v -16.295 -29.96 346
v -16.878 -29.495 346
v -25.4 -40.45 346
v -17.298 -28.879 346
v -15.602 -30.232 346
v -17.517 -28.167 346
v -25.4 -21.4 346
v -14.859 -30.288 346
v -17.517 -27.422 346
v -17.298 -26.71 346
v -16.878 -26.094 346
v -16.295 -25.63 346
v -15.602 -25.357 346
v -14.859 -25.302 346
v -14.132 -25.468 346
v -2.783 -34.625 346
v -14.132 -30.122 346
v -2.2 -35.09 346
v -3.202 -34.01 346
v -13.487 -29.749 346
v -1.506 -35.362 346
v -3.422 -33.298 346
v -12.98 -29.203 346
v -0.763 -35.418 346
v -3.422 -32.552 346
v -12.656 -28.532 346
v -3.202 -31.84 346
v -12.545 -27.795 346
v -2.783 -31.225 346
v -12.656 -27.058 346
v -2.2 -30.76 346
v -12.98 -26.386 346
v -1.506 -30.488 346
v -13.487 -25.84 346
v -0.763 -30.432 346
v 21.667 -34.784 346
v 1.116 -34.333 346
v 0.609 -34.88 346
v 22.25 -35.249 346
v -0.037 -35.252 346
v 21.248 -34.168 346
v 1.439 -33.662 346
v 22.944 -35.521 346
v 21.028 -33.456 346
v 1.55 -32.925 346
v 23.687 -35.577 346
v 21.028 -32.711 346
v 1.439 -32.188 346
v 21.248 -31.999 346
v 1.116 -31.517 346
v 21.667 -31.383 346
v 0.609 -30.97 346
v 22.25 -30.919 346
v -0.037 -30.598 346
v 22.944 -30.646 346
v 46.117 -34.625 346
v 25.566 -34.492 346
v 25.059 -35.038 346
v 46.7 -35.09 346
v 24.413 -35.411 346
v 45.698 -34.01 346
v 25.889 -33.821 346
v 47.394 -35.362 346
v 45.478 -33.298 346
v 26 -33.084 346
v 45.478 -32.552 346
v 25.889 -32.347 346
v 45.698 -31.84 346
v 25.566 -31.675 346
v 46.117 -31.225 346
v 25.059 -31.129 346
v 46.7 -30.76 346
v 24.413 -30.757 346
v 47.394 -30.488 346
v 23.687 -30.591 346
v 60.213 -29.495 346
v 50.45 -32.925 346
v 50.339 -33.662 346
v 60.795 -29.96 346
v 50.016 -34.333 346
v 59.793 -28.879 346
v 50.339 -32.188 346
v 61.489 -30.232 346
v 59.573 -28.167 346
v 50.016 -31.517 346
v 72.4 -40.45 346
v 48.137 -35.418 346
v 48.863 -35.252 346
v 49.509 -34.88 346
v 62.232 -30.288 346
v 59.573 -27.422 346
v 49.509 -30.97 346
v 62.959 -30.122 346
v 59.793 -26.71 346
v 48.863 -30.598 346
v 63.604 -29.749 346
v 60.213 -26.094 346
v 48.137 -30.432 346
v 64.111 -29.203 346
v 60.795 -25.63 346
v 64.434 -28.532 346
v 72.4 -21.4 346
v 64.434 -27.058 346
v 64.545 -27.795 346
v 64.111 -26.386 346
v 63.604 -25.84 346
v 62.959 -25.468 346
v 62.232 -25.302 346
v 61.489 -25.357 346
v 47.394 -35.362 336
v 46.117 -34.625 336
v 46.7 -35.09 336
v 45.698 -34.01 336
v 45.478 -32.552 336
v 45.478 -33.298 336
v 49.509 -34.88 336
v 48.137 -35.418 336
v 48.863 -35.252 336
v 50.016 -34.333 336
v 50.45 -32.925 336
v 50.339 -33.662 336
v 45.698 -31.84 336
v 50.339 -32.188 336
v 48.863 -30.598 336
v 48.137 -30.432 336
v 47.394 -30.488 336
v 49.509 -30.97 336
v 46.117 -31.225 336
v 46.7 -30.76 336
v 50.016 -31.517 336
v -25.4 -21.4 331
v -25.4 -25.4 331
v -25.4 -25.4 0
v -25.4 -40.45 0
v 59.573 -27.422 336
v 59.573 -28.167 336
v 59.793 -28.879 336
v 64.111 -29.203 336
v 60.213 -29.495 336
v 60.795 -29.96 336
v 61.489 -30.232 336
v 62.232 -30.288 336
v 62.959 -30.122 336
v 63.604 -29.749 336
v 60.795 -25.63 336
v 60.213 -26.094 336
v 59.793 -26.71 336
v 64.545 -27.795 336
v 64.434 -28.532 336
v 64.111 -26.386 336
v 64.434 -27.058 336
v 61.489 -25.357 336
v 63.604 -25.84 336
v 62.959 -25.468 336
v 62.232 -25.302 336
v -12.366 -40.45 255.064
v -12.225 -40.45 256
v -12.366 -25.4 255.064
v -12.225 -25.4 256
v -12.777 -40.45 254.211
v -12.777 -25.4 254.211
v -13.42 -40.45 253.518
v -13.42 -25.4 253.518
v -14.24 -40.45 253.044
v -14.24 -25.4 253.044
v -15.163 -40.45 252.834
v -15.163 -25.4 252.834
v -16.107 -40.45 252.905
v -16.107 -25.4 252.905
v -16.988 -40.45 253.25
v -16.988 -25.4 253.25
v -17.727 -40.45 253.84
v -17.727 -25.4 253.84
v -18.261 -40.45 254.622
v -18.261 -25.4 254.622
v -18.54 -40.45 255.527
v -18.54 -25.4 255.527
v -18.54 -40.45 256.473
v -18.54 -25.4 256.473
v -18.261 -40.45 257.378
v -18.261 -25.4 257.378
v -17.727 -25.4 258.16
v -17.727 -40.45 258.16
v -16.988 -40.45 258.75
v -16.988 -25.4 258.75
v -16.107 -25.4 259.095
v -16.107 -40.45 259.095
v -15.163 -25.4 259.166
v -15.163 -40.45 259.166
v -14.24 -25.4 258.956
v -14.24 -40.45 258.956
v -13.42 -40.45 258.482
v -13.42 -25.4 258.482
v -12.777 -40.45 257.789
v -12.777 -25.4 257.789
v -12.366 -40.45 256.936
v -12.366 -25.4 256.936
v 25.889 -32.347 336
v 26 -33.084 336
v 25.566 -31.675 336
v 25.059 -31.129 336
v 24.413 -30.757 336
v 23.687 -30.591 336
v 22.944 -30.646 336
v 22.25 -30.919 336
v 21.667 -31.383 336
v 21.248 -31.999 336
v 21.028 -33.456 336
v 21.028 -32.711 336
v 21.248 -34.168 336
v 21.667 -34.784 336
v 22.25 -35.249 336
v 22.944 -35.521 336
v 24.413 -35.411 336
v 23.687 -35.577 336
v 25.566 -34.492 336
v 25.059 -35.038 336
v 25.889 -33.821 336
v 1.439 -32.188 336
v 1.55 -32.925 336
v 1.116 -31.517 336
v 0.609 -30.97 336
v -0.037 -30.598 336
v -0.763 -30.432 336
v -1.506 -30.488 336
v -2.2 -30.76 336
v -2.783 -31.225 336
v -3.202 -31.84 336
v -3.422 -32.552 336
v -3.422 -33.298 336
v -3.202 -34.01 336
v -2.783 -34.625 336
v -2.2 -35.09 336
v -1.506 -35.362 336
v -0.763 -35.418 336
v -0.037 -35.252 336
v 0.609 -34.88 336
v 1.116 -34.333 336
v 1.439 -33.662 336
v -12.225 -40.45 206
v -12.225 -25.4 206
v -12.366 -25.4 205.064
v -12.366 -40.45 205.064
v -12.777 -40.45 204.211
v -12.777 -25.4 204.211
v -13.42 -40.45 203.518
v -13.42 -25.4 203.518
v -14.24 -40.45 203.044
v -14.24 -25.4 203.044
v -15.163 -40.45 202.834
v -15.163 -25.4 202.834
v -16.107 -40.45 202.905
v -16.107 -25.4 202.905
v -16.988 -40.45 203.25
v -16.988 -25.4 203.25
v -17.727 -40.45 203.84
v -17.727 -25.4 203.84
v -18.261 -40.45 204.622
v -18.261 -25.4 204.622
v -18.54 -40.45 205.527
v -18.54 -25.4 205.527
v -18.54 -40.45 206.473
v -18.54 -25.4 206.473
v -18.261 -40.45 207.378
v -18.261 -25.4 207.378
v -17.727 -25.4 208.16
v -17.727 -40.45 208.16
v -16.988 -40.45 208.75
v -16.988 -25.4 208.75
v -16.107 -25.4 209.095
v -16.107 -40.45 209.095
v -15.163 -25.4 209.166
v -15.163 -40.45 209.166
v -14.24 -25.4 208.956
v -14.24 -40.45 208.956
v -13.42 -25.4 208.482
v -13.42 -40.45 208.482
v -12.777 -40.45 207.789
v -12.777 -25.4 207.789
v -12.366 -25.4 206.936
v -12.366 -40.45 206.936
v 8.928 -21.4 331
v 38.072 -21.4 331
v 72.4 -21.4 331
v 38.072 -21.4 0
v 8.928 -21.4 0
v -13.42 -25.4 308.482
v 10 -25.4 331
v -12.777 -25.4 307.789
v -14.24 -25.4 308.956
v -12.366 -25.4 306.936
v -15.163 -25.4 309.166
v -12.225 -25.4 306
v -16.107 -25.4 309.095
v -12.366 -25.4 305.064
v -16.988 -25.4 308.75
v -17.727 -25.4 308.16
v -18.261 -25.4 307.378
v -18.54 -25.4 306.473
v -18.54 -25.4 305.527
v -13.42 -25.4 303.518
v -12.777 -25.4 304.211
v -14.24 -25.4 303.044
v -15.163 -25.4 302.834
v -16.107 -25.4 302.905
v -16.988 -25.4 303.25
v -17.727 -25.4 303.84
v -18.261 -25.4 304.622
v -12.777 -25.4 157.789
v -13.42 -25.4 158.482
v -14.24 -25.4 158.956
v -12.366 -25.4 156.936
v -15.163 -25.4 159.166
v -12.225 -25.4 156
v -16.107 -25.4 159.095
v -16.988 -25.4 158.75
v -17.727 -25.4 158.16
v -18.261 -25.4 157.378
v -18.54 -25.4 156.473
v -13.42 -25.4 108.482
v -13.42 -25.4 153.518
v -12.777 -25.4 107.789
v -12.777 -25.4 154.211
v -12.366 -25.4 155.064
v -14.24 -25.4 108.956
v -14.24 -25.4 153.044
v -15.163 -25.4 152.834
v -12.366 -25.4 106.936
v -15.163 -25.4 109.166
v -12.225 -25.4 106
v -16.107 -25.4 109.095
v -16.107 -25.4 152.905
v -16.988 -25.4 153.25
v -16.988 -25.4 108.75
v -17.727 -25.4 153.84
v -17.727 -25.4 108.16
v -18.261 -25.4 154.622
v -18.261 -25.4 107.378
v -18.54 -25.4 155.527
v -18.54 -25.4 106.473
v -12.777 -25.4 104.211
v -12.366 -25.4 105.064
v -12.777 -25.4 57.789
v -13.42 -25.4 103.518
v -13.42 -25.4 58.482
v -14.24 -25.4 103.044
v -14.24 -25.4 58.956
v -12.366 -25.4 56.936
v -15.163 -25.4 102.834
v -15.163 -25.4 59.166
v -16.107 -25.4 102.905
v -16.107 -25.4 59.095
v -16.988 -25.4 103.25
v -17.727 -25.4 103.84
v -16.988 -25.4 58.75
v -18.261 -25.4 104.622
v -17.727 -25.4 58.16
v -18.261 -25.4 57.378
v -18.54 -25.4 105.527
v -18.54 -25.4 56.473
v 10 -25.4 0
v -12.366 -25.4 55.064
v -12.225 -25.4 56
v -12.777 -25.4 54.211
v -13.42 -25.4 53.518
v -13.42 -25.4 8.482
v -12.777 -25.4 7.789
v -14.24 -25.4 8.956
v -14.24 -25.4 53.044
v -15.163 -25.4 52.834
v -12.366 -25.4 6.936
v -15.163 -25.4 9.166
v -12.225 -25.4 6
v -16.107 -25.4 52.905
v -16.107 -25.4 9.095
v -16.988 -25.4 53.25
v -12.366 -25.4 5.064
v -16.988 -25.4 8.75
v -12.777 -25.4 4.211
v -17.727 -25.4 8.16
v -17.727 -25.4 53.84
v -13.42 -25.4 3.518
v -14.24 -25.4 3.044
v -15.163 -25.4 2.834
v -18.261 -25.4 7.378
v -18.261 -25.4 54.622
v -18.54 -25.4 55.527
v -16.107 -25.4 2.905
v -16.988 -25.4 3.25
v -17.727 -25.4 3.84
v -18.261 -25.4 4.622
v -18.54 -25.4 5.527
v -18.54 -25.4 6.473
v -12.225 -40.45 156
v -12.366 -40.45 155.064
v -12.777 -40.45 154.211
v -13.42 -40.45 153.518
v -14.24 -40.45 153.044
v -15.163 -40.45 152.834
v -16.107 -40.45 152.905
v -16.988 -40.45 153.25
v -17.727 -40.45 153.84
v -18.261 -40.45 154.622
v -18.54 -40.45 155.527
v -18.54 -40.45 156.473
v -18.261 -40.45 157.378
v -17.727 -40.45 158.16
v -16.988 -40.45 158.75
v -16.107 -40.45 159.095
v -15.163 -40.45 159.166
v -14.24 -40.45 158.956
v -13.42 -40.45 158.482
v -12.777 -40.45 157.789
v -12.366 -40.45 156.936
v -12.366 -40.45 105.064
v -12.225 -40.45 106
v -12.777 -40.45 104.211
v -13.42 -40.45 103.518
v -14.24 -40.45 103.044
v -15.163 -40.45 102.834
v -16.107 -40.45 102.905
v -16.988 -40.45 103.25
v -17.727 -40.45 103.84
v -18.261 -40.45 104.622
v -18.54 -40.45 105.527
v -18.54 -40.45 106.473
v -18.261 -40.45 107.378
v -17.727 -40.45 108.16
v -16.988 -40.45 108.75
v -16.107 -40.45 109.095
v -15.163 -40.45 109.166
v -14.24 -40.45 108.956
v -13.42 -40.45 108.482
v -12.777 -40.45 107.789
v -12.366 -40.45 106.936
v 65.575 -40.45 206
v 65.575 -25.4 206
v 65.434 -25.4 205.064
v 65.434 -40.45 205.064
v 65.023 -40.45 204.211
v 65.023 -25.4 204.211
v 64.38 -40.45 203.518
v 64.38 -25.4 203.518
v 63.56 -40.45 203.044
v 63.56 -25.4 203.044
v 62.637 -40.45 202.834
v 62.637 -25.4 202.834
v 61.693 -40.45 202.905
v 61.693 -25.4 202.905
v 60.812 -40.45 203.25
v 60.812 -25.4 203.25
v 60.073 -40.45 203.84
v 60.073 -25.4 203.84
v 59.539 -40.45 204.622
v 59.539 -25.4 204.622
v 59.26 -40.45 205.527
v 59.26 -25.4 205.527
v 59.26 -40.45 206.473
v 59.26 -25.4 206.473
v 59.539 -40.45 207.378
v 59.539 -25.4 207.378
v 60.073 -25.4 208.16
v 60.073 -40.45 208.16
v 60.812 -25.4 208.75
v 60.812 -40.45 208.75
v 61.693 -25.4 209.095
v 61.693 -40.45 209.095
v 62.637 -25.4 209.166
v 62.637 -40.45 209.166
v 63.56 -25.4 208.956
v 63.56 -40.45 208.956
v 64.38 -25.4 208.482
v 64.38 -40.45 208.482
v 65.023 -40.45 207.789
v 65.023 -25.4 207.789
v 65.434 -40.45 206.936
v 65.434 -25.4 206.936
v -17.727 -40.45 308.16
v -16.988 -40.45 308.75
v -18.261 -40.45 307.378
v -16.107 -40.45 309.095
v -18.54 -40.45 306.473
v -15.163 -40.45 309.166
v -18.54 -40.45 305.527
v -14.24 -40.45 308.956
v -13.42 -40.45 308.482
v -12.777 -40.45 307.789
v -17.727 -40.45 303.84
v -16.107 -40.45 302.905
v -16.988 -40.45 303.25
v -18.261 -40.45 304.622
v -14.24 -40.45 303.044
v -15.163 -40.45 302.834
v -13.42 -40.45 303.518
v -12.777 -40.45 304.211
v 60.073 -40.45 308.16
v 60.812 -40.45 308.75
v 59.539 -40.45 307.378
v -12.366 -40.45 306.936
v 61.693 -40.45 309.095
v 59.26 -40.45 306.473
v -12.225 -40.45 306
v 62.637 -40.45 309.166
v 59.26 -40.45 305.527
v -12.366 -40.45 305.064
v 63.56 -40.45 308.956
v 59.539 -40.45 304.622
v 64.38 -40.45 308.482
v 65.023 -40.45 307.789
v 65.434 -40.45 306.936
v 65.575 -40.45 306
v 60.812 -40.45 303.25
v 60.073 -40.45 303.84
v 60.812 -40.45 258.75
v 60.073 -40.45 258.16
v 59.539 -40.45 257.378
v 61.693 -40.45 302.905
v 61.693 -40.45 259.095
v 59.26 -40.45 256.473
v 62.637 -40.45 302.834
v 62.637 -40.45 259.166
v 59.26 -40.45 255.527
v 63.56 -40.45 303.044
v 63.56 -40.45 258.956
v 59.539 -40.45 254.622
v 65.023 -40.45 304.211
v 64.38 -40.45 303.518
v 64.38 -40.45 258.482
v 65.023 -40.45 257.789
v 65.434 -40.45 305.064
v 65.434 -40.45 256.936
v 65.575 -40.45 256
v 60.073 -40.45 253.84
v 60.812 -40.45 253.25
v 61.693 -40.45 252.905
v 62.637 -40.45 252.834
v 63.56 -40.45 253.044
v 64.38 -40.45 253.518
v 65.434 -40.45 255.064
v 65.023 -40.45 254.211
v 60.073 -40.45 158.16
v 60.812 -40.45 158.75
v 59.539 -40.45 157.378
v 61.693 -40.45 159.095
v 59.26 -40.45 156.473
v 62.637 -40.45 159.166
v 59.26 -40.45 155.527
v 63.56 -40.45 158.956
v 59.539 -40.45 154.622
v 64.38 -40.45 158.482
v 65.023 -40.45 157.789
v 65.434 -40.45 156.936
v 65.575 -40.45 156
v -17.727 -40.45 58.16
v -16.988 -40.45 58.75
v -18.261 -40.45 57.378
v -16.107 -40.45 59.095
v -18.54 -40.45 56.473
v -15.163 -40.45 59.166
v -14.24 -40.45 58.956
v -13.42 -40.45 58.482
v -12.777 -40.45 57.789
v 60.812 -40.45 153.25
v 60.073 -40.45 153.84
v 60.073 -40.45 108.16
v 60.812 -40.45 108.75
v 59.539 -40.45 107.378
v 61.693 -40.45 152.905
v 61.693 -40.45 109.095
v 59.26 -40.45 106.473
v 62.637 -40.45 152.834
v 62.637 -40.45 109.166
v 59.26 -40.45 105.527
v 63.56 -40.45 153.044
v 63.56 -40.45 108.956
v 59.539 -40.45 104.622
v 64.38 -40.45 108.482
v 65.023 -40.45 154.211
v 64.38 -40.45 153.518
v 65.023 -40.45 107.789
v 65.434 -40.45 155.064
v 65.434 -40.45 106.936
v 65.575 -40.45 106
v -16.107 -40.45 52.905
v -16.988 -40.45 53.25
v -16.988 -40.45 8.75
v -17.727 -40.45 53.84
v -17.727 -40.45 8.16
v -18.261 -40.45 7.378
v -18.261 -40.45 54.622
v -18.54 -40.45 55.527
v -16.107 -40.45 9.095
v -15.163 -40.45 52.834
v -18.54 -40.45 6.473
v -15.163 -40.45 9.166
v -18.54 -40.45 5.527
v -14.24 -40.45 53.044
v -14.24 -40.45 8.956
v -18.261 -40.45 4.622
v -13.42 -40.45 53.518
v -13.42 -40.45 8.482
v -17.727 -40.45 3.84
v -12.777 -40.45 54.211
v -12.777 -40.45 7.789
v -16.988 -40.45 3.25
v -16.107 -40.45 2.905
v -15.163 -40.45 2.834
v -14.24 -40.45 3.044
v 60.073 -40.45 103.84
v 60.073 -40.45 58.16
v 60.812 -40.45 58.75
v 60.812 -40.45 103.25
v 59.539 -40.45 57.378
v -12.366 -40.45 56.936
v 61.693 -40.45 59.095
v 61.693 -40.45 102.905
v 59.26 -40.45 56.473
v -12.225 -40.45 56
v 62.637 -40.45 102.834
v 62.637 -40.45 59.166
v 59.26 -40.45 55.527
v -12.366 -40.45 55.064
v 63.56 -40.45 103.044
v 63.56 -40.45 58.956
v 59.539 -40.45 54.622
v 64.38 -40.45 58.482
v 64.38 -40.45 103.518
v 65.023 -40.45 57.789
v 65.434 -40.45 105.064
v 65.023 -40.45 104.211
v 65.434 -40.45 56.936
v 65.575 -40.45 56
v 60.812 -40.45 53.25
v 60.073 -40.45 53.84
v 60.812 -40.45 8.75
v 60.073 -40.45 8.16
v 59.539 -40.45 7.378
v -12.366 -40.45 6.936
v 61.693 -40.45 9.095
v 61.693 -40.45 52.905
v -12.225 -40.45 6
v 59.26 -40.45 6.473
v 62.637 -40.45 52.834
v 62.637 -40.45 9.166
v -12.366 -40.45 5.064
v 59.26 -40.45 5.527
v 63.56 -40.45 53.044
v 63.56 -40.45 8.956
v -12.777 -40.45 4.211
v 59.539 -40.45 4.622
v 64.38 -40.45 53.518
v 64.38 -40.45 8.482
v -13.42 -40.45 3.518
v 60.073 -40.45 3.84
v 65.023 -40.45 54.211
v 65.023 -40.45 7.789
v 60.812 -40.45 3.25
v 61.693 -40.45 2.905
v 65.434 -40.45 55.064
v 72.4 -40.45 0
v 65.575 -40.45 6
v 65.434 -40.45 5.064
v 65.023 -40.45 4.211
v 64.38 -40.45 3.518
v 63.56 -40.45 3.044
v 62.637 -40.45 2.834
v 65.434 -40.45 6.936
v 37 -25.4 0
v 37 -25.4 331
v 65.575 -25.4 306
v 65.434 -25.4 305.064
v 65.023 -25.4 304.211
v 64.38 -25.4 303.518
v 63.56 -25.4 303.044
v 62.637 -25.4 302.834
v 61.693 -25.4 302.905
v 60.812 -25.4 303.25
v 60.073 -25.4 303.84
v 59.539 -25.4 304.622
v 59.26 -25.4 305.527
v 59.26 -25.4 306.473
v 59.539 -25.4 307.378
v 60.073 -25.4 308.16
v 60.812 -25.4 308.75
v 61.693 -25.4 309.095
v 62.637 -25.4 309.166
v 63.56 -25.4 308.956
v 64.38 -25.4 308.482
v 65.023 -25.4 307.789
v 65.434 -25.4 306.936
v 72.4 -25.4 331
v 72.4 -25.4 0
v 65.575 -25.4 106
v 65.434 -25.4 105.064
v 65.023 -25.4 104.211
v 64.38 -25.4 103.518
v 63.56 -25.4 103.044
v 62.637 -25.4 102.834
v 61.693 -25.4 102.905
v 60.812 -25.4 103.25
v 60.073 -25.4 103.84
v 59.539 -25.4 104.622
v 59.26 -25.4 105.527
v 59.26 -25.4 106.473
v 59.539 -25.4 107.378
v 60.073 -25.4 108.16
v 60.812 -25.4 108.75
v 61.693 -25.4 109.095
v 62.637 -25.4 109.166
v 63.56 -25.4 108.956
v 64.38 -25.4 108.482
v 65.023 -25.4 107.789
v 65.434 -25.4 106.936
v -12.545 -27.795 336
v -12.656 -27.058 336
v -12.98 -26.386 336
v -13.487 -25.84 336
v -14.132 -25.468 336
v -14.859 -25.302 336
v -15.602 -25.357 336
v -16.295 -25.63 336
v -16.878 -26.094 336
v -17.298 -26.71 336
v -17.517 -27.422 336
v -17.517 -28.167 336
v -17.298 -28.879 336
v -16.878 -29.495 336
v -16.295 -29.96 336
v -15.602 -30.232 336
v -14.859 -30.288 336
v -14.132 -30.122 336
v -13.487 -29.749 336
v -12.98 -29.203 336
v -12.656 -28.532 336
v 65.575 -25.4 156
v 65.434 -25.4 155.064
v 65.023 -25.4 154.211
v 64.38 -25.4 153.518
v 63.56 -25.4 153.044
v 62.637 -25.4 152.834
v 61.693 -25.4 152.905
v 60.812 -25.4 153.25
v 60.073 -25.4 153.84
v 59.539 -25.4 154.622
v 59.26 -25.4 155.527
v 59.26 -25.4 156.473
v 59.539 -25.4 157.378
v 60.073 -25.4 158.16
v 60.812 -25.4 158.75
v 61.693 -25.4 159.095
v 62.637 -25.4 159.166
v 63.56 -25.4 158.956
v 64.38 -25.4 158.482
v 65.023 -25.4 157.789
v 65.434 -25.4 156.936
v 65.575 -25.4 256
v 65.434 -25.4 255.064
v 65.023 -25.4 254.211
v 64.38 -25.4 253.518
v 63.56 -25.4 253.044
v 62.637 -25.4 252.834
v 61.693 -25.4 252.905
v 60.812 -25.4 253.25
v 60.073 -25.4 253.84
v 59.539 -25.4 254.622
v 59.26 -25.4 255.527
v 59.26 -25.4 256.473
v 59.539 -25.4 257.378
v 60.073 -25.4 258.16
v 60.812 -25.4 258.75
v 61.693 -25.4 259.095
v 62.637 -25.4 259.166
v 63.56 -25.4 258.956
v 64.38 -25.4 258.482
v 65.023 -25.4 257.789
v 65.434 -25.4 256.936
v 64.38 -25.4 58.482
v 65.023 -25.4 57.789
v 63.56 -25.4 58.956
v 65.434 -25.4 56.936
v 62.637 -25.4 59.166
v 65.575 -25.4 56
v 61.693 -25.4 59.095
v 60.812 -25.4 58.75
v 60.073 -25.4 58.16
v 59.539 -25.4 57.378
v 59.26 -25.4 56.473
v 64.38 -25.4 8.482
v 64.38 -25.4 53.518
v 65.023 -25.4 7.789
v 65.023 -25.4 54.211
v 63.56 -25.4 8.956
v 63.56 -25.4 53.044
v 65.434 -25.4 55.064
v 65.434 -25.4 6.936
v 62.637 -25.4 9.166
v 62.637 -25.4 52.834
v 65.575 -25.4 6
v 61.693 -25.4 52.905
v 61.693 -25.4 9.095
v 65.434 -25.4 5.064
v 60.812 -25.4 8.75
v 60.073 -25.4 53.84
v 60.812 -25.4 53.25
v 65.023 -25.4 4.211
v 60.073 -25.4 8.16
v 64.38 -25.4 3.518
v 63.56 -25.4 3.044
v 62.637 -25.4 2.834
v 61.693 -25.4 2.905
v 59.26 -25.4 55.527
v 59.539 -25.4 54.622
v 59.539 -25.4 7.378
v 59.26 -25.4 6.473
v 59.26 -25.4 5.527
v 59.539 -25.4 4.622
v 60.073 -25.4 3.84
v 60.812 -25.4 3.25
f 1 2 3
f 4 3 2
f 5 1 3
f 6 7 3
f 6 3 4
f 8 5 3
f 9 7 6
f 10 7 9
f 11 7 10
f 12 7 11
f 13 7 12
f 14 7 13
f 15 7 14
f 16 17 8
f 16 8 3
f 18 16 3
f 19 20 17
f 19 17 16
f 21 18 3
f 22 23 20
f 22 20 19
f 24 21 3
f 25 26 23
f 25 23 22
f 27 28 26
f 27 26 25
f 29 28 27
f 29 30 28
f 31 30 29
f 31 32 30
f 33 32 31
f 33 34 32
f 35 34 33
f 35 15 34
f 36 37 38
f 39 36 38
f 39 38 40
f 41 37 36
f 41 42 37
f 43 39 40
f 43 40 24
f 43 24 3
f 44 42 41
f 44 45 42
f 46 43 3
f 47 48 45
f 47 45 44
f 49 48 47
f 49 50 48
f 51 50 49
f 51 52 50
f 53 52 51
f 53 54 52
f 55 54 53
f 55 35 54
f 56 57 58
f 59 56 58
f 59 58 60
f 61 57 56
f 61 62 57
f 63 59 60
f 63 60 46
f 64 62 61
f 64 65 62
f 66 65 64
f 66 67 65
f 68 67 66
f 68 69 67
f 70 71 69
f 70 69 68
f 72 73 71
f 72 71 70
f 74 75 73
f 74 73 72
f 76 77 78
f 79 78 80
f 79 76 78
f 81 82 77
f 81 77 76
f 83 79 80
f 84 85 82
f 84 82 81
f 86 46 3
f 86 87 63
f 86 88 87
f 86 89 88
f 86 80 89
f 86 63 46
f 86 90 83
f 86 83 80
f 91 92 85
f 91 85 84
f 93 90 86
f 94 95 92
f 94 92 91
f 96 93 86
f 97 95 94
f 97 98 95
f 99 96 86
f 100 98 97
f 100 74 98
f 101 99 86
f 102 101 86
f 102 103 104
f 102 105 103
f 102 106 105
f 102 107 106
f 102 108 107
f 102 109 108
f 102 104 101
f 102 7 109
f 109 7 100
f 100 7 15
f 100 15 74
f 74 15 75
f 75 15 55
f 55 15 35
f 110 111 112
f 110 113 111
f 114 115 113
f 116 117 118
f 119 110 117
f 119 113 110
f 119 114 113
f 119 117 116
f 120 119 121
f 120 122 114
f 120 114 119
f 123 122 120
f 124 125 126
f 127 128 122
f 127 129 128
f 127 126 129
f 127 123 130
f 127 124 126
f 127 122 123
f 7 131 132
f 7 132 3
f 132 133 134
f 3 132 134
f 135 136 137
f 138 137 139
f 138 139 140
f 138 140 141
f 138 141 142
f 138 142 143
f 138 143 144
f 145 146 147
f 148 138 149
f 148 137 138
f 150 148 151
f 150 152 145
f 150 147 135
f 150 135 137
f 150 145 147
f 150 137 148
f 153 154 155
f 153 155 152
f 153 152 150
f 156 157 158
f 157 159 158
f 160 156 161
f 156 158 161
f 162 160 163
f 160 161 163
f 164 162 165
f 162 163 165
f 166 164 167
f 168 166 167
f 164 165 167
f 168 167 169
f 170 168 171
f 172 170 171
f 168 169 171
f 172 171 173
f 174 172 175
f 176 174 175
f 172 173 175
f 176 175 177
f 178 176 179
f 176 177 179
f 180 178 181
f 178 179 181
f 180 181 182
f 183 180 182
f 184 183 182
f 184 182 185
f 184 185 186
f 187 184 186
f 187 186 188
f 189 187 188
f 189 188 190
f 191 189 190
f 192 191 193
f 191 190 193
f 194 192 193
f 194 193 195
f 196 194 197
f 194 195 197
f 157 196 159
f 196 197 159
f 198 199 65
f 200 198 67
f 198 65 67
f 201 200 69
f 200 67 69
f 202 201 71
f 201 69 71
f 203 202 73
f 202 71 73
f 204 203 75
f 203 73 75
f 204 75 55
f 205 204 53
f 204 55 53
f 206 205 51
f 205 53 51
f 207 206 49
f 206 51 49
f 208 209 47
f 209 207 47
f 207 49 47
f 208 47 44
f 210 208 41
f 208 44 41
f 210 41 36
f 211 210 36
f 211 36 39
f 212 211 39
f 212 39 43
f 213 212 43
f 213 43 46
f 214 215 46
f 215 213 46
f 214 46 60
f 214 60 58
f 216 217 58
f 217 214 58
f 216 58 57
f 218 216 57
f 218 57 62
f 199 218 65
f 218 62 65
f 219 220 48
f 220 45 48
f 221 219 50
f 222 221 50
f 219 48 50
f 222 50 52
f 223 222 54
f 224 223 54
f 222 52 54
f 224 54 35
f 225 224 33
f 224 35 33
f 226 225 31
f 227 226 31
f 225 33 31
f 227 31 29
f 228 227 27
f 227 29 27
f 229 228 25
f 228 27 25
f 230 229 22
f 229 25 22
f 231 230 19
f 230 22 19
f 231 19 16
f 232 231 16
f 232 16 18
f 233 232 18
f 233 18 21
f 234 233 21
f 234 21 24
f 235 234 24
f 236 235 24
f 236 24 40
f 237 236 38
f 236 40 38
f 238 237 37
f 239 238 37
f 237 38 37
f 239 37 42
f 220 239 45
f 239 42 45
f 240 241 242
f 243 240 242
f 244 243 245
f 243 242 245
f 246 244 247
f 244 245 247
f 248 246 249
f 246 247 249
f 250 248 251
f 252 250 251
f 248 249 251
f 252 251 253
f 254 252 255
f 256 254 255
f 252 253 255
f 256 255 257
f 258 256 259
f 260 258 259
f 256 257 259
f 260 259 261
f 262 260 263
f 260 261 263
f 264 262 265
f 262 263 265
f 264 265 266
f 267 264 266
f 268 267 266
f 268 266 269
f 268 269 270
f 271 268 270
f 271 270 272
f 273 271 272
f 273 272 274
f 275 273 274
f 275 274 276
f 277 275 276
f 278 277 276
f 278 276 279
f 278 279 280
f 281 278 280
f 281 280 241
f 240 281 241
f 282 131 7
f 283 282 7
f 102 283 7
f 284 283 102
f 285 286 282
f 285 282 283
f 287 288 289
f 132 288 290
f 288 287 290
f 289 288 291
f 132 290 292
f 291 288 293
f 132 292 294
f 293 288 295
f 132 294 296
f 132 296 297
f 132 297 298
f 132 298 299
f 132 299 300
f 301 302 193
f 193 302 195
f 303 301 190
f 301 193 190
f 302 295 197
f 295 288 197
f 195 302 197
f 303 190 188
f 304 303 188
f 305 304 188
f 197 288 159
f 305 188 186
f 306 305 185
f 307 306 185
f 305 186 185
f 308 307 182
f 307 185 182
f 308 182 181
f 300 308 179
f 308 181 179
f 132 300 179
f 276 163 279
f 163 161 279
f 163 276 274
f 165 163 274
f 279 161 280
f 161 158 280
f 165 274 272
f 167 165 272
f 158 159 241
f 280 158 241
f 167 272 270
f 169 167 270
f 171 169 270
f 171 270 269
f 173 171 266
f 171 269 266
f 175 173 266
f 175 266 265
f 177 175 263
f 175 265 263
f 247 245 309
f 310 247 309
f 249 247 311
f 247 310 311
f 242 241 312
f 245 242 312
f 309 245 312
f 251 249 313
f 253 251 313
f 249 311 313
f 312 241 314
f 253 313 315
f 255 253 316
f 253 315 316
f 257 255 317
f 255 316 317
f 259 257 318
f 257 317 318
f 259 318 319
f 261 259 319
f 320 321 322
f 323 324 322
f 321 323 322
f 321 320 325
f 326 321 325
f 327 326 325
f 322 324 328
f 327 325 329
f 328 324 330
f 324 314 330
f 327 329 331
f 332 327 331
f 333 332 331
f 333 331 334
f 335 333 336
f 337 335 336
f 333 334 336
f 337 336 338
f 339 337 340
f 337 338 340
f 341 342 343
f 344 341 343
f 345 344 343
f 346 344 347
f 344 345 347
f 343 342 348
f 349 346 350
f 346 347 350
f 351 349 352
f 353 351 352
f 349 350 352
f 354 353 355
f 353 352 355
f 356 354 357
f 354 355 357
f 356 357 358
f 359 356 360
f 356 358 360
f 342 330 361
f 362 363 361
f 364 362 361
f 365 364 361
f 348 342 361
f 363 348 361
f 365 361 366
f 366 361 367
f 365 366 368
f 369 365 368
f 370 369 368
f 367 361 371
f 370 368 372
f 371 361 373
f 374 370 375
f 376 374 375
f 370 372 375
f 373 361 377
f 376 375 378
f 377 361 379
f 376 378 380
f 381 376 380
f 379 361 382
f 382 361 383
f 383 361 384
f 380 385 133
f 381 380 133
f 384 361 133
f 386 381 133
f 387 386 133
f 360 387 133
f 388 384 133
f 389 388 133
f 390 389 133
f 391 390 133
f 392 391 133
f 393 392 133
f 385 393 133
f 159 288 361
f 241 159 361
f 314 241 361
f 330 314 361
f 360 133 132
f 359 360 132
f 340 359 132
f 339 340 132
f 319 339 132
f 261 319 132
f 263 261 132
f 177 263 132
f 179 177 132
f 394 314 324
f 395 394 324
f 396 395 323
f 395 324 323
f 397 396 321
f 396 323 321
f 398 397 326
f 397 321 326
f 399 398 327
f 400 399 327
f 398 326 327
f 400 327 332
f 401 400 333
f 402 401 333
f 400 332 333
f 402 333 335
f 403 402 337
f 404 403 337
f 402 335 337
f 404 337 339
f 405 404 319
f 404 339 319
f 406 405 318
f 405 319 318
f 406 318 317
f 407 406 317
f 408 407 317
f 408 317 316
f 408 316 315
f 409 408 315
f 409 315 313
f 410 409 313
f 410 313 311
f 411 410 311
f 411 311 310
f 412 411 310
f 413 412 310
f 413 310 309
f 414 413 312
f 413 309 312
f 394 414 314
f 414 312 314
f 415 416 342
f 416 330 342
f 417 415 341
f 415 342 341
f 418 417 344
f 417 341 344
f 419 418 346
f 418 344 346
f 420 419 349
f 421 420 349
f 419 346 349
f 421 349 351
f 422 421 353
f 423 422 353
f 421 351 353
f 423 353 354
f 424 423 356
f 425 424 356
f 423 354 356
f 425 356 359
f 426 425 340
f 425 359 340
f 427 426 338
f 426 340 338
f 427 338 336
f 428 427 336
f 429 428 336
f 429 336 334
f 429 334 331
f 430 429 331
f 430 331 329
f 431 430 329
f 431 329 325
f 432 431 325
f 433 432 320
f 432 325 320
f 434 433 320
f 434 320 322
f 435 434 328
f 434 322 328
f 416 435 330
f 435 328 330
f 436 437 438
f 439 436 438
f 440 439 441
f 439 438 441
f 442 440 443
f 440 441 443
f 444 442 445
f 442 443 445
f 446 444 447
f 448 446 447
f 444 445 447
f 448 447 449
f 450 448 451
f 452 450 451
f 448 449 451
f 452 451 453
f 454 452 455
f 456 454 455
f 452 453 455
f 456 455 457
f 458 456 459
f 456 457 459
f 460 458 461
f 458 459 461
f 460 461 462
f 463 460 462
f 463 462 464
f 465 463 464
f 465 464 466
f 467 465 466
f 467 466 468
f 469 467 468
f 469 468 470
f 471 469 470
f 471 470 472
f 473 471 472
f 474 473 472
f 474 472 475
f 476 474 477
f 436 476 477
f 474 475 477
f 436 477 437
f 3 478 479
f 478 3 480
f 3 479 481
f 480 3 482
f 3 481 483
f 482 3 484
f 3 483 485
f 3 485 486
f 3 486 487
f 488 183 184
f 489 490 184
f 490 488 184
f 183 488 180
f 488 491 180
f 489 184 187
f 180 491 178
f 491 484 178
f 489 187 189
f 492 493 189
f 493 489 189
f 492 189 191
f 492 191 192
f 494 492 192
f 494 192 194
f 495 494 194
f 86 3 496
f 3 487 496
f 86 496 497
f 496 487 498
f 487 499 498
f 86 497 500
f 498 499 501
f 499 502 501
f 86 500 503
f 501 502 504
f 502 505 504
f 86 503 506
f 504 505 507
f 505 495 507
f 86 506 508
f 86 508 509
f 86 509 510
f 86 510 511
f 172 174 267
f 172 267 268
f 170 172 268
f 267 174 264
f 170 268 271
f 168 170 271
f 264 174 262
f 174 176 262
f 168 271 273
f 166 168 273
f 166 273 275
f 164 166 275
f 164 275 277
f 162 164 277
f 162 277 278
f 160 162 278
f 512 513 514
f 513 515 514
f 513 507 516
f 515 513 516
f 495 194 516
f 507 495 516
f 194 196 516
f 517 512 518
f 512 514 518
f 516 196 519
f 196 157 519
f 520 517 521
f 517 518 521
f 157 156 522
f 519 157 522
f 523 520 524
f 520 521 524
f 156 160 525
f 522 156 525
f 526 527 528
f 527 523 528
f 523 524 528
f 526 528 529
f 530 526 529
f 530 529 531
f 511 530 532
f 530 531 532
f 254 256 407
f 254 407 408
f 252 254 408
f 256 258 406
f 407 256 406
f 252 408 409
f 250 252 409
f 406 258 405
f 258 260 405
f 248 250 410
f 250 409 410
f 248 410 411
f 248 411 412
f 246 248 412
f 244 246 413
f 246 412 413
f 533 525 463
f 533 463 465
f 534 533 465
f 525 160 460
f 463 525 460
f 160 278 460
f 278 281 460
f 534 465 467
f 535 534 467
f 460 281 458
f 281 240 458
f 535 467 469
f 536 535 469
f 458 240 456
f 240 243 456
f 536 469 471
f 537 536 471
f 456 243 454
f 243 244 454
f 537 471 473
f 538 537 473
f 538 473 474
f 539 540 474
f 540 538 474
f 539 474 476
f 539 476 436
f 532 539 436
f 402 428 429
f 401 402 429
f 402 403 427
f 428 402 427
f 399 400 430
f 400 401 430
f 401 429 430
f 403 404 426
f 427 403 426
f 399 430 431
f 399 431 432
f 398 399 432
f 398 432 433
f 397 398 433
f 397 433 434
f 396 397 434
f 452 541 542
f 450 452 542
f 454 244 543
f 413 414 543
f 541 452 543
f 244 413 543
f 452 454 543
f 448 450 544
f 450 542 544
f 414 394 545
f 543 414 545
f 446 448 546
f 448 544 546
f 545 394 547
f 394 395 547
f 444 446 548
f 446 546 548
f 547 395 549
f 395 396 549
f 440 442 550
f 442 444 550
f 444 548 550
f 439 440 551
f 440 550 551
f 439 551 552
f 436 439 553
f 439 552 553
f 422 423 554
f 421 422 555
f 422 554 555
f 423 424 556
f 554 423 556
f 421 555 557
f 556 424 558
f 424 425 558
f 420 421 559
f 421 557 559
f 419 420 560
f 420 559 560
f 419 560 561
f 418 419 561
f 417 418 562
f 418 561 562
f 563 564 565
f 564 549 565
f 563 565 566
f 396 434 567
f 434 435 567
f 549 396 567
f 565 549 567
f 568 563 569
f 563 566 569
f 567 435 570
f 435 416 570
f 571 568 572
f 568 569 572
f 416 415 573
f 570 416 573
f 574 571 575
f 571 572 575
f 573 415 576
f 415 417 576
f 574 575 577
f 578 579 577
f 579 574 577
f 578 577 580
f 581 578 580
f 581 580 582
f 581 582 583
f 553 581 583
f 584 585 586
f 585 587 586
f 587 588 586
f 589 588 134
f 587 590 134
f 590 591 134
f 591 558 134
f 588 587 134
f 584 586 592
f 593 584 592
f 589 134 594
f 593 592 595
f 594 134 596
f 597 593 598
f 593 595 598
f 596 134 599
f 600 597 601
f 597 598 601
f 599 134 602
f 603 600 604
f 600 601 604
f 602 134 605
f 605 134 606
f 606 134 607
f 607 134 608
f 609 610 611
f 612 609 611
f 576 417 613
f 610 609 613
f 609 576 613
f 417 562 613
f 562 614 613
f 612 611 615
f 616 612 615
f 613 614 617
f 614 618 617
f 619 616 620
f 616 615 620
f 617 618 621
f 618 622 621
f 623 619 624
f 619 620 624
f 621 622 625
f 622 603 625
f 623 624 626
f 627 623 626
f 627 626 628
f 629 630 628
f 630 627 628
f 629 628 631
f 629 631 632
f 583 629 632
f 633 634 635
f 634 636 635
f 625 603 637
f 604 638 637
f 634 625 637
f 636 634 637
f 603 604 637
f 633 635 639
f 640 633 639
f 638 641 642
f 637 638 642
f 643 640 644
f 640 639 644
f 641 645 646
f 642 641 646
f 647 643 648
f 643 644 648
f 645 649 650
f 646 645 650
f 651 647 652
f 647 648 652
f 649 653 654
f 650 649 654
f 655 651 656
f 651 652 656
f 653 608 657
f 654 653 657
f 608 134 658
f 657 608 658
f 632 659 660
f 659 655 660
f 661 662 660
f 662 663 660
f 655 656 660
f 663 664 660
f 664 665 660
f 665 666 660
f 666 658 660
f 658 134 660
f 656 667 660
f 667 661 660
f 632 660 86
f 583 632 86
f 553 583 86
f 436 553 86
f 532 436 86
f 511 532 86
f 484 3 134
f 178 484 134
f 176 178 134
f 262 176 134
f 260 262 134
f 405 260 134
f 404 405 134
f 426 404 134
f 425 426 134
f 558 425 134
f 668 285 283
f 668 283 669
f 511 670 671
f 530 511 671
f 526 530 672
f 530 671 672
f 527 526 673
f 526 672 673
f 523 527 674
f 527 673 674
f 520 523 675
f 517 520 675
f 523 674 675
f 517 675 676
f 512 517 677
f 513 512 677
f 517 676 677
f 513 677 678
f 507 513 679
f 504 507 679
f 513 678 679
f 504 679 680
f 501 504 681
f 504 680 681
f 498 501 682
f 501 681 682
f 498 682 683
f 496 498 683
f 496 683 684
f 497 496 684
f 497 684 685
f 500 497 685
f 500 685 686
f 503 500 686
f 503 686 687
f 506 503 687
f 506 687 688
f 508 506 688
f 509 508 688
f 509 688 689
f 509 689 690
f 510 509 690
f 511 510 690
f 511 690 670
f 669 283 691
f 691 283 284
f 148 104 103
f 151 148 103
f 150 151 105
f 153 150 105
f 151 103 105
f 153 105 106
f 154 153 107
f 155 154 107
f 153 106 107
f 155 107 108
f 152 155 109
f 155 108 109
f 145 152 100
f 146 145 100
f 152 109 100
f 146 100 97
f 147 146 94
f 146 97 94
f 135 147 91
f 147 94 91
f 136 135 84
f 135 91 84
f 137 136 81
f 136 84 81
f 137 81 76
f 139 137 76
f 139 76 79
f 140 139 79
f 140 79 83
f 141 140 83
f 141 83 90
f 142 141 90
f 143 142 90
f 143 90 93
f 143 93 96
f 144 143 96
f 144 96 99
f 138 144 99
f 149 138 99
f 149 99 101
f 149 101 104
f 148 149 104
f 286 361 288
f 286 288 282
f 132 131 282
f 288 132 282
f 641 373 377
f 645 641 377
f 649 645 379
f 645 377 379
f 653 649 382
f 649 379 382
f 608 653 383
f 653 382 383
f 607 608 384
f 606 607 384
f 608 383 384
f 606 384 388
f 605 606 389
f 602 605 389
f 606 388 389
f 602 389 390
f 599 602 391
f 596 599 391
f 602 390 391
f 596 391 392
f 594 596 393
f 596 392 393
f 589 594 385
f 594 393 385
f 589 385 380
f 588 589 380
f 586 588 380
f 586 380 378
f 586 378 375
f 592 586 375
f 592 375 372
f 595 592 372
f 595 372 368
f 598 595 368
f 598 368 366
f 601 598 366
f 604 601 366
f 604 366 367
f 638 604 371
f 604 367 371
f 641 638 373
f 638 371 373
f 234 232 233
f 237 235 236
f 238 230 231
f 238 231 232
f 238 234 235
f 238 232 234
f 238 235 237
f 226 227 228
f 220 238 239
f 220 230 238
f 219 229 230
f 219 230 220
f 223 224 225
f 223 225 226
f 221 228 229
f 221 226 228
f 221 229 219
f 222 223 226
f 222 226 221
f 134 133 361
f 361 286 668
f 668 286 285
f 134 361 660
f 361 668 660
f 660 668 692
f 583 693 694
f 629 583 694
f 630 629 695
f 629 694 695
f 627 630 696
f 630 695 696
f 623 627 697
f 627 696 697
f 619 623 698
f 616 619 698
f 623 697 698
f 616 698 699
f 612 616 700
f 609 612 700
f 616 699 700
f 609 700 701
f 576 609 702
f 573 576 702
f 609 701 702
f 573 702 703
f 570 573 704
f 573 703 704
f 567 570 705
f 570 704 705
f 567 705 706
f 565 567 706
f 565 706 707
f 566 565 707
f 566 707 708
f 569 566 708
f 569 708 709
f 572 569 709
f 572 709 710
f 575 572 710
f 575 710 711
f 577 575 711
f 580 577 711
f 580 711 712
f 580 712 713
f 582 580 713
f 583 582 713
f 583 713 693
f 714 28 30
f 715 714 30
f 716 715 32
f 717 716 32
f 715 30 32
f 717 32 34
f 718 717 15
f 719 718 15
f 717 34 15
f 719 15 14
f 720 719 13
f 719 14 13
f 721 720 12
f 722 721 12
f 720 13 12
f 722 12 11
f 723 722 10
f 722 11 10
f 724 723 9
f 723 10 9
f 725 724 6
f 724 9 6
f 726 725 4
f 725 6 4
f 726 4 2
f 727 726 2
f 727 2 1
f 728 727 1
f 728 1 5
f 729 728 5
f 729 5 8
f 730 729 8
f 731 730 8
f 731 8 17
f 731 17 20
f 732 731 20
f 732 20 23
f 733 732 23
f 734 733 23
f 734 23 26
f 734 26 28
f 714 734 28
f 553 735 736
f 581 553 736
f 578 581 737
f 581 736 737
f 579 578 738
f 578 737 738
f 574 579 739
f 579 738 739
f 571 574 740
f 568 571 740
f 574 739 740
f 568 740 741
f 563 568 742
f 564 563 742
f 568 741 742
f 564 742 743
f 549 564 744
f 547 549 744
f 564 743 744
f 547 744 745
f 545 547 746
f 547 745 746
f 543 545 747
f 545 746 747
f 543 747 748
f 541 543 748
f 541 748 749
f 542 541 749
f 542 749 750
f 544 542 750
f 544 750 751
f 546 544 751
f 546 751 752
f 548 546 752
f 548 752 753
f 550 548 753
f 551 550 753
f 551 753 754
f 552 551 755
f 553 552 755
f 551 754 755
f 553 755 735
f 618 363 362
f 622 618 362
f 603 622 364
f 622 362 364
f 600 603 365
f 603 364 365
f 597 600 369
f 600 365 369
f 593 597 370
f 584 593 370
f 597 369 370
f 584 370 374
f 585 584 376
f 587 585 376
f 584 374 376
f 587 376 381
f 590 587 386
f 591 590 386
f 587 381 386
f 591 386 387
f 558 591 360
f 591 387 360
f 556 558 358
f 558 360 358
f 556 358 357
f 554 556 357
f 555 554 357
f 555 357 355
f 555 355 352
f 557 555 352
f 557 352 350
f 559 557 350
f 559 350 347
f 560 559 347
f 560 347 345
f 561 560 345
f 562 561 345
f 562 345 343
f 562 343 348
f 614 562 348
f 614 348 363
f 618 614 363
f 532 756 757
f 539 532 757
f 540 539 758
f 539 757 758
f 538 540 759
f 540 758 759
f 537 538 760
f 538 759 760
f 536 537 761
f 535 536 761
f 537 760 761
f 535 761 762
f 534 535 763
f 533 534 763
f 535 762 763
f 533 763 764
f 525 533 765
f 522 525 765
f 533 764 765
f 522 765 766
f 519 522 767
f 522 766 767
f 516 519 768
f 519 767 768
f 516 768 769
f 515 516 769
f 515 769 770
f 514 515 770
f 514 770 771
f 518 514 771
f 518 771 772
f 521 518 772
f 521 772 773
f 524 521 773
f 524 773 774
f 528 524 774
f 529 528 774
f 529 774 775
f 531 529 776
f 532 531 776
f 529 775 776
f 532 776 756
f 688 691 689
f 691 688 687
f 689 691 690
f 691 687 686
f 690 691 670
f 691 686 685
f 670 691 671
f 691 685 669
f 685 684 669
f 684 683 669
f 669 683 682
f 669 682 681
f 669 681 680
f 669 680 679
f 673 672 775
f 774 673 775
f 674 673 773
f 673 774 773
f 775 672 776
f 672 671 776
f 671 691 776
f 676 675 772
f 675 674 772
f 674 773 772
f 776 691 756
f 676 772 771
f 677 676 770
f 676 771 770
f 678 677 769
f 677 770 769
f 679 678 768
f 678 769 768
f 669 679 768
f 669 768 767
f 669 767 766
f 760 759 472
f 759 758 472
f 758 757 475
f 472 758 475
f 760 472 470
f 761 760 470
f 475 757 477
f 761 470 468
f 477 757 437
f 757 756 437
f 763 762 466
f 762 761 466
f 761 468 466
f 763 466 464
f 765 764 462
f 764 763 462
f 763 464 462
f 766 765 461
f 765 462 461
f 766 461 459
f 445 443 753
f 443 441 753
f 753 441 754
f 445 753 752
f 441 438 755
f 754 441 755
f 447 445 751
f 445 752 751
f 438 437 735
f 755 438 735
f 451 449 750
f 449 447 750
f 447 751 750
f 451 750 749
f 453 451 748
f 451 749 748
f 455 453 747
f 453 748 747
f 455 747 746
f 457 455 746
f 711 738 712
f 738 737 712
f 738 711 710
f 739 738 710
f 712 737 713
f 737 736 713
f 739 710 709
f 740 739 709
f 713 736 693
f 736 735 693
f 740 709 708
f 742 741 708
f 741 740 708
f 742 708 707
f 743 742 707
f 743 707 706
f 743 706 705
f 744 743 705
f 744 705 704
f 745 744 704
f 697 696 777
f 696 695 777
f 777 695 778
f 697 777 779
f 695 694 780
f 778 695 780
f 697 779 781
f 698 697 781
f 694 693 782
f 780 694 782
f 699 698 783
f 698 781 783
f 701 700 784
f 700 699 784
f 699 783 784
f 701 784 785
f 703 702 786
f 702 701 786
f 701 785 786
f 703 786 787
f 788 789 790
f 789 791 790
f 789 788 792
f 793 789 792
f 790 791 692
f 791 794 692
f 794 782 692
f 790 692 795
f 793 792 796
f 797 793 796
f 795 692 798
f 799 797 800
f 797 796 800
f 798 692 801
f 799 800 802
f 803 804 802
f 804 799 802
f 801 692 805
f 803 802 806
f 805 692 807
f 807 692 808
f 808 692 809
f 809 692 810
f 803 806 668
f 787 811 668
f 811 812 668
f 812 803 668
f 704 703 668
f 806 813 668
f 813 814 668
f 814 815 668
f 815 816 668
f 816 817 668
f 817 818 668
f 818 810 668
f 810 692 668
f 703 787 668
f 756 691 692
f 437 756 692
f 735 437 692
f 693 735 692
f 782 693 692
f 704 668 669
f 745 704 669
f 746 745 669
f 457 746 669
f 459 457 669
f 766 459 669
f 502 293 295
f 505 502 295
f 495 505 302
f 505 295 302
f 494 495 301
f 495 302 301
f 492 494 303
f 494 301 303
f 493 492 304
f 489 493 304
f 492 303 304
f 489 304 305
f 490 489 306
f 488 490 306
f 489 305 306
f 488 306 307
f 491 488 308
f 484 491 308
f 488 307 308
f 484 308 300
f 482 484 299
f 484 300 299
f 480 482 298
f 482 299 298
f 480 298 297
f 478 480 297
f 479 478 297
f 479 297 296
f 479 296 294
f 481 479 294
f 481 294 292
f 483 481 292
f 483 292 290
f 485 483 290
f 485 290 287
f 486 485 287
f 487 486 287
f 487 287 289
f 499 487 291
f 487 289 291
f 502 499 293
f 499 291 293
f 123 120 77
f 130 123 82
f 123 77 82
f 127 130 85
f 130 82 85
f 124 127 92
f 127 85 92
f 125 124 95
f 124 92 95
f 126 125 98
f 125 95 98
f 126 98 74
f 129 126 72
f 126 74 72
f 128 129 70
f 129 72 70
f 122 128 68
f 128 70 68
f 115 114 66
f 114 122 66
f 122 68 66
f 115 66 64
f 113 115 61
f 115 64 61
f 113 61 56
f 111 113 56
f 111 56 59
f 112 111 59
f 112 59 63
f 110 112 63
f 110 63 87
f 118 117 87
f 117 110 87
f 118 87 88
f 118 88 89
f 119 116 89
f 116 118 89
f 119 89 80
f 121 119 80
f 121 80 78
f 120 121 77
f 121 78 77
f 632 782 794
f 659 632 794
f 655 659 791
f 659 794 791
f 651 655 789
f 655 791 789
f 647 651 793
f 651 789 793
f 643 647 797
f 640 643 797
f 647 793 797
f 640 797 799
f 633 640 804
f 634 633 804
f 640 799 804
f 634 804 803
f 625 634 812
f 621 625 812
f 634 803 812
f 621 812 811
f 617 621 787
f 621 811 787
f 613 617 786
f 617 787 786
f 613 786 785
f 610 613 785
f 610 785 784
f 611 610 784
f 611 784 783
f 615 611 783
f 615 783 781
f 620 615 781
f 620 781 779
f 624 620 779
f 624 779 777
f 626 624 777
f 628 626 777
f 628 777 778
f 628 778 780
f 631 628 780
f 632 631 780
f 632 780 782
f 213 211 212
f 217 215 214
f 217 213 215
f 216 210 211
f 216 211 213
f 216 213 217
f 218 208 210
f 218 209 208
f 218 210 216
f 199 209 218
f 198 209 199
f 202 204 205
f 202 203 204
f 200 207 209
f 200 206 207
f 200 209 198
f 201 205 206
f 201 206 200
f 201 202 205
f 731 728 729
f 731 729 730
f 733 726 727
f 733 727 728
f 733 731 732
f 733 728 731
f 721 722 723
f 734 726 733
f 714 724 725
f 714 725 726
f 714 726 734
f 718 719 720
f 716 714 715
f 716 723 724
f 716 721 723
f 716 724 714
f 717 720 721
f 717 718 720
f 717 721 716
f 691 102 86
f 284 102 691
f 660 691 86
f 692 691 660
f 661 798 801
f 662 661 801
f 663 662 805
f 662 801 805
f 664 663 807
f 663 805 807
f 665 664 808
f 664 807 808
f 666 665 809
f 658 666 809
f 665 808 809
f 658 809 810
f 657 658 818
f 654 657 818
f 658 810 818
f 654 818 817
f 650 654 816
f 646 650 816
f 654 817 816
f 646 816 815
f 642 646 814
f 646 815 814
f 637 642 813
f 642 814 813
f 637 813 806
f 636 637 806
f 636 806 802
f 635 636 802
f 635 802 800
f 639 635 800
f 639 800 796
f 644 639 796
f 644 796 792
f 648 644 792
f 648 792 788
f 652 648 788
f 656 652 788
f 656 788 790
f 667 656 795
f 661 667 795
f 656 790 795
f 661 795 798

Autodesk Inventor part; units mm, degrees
ref_plane "YZ Plane" through (0, 0, 0) normal (1, 0, 0) x (0, 1, 0)
ref_plane "XZ Plane" through (0, 0, 0) normal (0, 1, 0) x (-1, 0, 0)
ref_plane "XY Plane" through (0, 0, 0) normal (0, 0, 1) x (1, 0, 0)
sketch "Sketch1" plane through (0, 0, 0) normal (0, 0, 1) x (1, 0, 0)
  line L0 (38.0718, -21.4) -> (37, -25.4)
  line L1 (37, -25.4) -> (38.0718, -21.4)
  line L2 (8.9282, -21.4) -> (38.0718, -21.4)
  line L3 (38.0718, -21.4) -> (8.9282, -21.4)
  line L4 (10, -25.4) -> (8.9282, -21.4)
  line L5 (8.9282, -21.4) -> (10, -25.4)
  line L6 (10, -25.4) -> (0, -25.4)
  line L7 (10, -25.4) -> (0, -25.4)
  line L8 (47, -25.4) -> (37, -25.4)
  line L9 (37, -25.4) -> (47, -25.4)
  line L10 (38.0718, -21.4) -> (37, -25.4)
  line L11 (37, -25.4) -> (38.0718, -21.4)
  line L12 (8.9282, -21.4) -> (38.0718, -21.4)
  line L13 (38.0718, -21.4) -> (8.9282, -21.4)
  line L14 (10, -25.4) -> (8.9282, -21.4)
  line L15 (8.9282, -21.4) -> (10, -25.4)
  line L16 (10, -25.4) -> (0, -25.4)
  line L17 (10, -25.4) -> (0, -25.4)
  line L18 (47, -25.4) -> (37, -25.4)
  line L19 (37, -25.4) -> (47, -25.4)
  line L20 (0, -38.1) -> (47, -38.1)
  line L21 (47, -25.4) -> (72.4, -25.4)
  line L22 (72.4, -25.4) -> (72.4, -38.1)
  line L23 (72.4, -38.1) -> (47, -38.1)
  line L24 (0, -25.4) -> (-25.4, -25.4)
  line L25 (-25.4, -25.4) -> (-25.4, -38.1)
  line L26 (-25.4, -38.1) -> (0, -38.1)
  point P0 (0, 0)
  point P1 (0, 0)
  point P2 (0, 0)
  dimension "d52" = 4
  dimension "d53" = 27
  dimension "d54" = 29.1436
extrude "Extrusion1" add sketch "Sketch1" along normal blind 331
sketch "Sketch4" plane through (0, 0, 0) normal (0, 0, -1) x (-1, 0, 0)
  line L0 (-38.0718, -21.4) -> (-8.9282, -21.4) projected
  line L1 (-8.9282, -21.4) -> (-8.9282, -38.1)
  line L2 (25.4, -38.1) -> (-72.4, -38.1) projected
  line L3 (25.4, -38.1) -> (25.4, -40.45)
  line L4 (25.4, -40.45) -> (-72.4, -40.45)
  line L5 (-72.4, -40.45) -> (-72.4, -38.1)
  line L6 (-72.4, -38.1) -> (25.4, -38.1)
  line L7 (25.4, -38.1) -> (25.4, -40.45)
  point P0 (0, 0)
  dimension "d26" = 2.35
extrude "Extrusion4" add sketch "Sketch4" against normal blind 331
sketch "Sketch3" plane through (37, -25.4, 331) normal (0, 1, 0) x (1, 0, 0)
  line L0 (35.4, 0) -> (0, 0) projected
  line L1 (-28.0718, 0) -> (-27, 0) projected
  line L2 (0, 0) -> (-27, 0)
  line L3 (-27, 0) -> (-13.5, 0)
  line L4 (-13.5, 0) -> (-13.5, 11.6369)
  line L5 (-13.5, 0) -> (-1.8631, 0) construction
  line L6 (35.4, 0) -> (25.4, 0)
  line L7 (25.4, 0) -> (25.4, 25)
  line L8 (25.4, 25) -> (25.4, 75)
  line L9 (25.4, 75) -> (25.4, 125)
  line L10 (25.4, 125) -> (25.4, 175)
  line L11 (25.4, 175) -> (25.4, 225)
  line L12 (25.4, 225) -> (25.4, 275)
  line L13 (25.4, 275) -> (25.4, 325)
  circle A0 centre (25.4, 325) radius 3.175
  circle A1 centre (25.4, 275) radius 3.175
  circle A2 centre (25.4, 225) radius 3.175
  circle A3 centre (25.4, 175) radius 3.175
  circle A4 centre (25.4, 125) radius 3.175
  circle A5 centre (25.4, 75) radius 3.175
  circle A6 centre (25.4, 25) radius 3.175
  circle A7 centre (-52.4, 325) radius 3.175
  circle A8 centre (-52.4, 275) radius 3.175
  circle A9 centre (-52.4, 225) radius 3.175
  circle A10 centre (-52.4, 175) radius 3.175
  circle A11 centre (-52.4, 125) radius 3.175
  circle A12 centre (-52.4, 75) radius 3.175
  circle A13 centre (-52.4, 25) radius 3.175
  point P0 (-37, 331)
  dimension "d8" = 90
  dimension "d9" = 10
  dimension "d10" = 25
  dimension "d11" = 50
  dimension "d12" = 50
  dimension "d13" = 50
  dimension "d14" = 50
  dimension "d15" = 50
  dimension "d16" = 50
  dimension "d17" = 6.35
  dimension "d18" = 6.35
  dimension "d19" = 6.35
  dimension "d20" = 6.35
  dimension "d21" = 6.35
  dimension "d22" = 6.35
  dimension "d23" = 6.35
extrude "Extrusion3" cut sketch "Sketch3" against normal blind 300
sketch "Sketch5" plane through (0, 0, 331) normal (0, 0, 1) x (1, 0, 0)
  line L0 (37, -25.4) -> (38.0718, -21.4) projected
  line L1 (38.0718, -21.4) -> (72.4488, -21.4)
  line L2 (72.4488, -40.7637) -> (72.4488, -13.0005)
  line L3 (-25.4, -25.4) -> (-25.4, -40.45) projected
  line L4 (72.4488, -21.4) -> (-25.4, -21.4)
  line L5 (-25.4, -21.4) -> (-25.4, -40.45)
  line L6 (-25.4, -40.45) -> (72.4488, -40.45)
  line L7 (72.4488, -40.45) -> (72.4488, -21.4)
  point P0 (0, 0)
extrude "Extrusion5" add sketch "Sketch5" along normal blind 35
sketch "Sketch6" plane through (0, 0, 366) normal (0, 0, 1) x (1, 0, 0)
  point P0 (0, 0)
sketch "Sketch7" plane through (72.4, -40.45, 0) normal (1, 0, 0) x (0, 0, -1)
  point P0 (0, 40.45)
sketch "Sketch8" plane through (0, 0, 366) normal (0, 0, 1) x (1, 0, 0)
  line L0 (-25.4, -21.4) -> (-25.4, -40.45) projected
  line L1 (-25.4, -21.4) -> (-25.4, -25.4)
  line L2 (72.4, -40.45) -> (72.4488, -40.45) projected
  line L3 (-25.4, -25.4) -> (72.4488, -40.45)
  line L4 (72.4, -40.45) -> (72.4, -25.4) projected
  line L5 (72.4488, -40.45) -> (72.4, -25.4)
  line L6 (72.4, -25.4) -> (-25.4, -40.45)
  line L7 (23.5, -32.925) -> (-0.95, -32.925)
  line L8 (-0.95, -32.925) -> (47.95, -32.925)
  circle A0 centre (-0.95, -32.925) radius 2.5
  circle A1 centre (23.5, -33.0837) radius 2.5
  circle A2 centre (47.95, -32.925) radius 2.5
  point P0 (0, 0)
  point P1 (-25.4, -38.1)
  dimension "d31" = 4
  dimension "d32" = 24.45
  dimension "d33" = 48.9
  dimension "d34" = 5
  dimension "d35" = 5
  dimension "d36" = 5
extrude "Extrusion6" cut sketch "Sketch8" against normal blind 30 contours A0 | A1 L6 L3 | L3 L7 A1 | A1 L7 L6 | L6 L3 A1 | A1 L8 L6 | A2 | L3 L8 A1
sketch "Sketch9" plane through (0, 0, 366) normal (0, 0, 1) x (1, 0, 0)
  circle A0 centre (-0.95, -32.925) radius 2.5 projected
  line L0 (-0.95, -32.925) -> (13.1454, -27.7947)
  line L1 (-0.95, -32.925) -> (14.05, -32.925) construction
  line L2 (-0.95, -32.925) -> (-15.0454, -27.7947)
  line L3 (-0.95, -32.925) -> (14.05, -32.925) construction
  circle A1 centre (47.95, -32.925) radius 2.5 projected
  line L4 (47.95, -32.925) -> (62.0454, -27.7947)
  line L5 (47.95, -32.925) -> (62.95, -32.925) construction
  circle A2 centre (-15.0454, -27.7947) radius 2.5
  circle A3 centre (62.0454, -27.7947) radius 2.5
  point P0 (0, 0)
  dimension "d39" = 15
  dimension "d40" = 20
  dimension "d41" = 15
  dimension "d42" = 160
  dimension "d43" = 15
  dimension "d44" = 20
  dimension "d45" = 5
  dimension "d46" = 5
extrude "Extrusion7" cut sketch "Sketch9" against normal blind 30 contours A2 | A3
sketch "Sketch10" plane through (8.9282, -21.4, 0) normal (0, 1, 0) x (1, 0, 0)
  line L0 (-34.3282, -331) -> (-34.3282, -366) projected
  line L1 (63.5206, -331) -> (63.5206, -366) projected
  line L2 (-34.3282, -366) -> (63.5206, -366)
  line L3 (63.5206, -366) -> (63.5206, -331)
  line L4 (63.5206, -331) -> (-34.3282, -331)
  line L5 (-34.3282, -331) -> (-34.3282, -366)
  line L6 (63.4718, 0) -> (63.4718, -331) projected
  line L7 (63.4718, -331) -> (-34.3282, -331)
  line L8 (-34.3282, -331) -> (-34.3282, -346)
  line L9 (-34.3282, -346) -> (63.4718, -346)
  line L10 (63.4718, -346) -> (63.4718, -331)
  point P0 (-8.9282, 0)
  point P1 (-34.3282, -346)
  dimension "d49" = 15
extrude "Extrusion8" cut sketch "Sketch10" against normal blind 30 contours L9 L10 L4 L1 L2 L0
properties part number "5212_Bias_TxRx_Relative_Dovetail_Male_MPSv2_v3" material "Polyethylene, High Density"
